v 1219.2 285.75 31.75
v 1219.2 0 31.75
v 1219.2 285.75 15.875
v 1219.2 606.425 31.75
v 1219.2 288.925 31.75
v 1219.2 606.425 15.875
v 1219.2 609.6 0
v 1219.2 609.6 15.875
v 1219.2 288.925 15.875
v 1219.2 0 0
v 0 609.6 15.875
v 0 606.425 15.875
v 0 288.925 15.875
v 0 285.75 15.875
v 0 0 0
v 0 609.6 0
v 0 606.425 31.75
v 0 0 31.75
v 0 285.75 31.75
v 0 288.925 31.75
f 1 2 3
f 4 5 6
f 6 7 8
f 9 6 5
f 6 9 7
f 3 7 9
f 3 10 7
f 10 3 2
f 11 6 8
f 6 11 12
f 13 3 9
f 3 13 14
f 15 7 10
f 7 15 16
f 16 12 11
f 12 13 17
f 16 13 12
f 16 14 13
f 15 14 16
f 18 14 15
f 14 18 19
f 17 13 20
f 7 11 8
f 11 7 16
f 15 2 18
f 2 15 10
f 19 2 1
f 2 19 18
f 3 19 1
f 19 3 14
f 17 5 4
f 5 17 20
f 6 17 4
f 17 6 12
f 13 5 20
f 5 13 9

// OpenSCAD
$fn=100;
NozzleWidth = 1.0;
LayerHeight = 0.24;
InitialLayerHeight = 0.4;
mmPerInch = 25.4;

function InchTomm(inches = 1) = inches * mmPerInch;
function height2layers(mm = 1) = mm/LayerHeight;
function layers2Height(layers) = InitialLayerHeight + ((layers - 1) * LayerHeight);
function BaseHeight() = layers2Height(6);
function WallThickness(count) = count * NozzleWidth;

ply48 = InchTomm(48);
ply24 = InchTomm(24);
plyThickness = InchTomm(5/8);
plyHeight = ply48;
plyWidth = ply24;
BoxWidth = InchTomm(12.5);
BoxLength = ply48;
BladeWidth = InchTomm(1/8);

Build();

module Build(args) 
{
    // BuildBox();
    Cuts();
}

module BuildBox(args) 
{
    //Right Side
    translate([0, BoxWidth, plyThickness]) 
    rotate([90,0,0])
    PlywoodSheet(length = plyHeight, width= plyWidth, thickness = plyThickness);

    //Left Side
    translate([0, plyThickness, plyThickness]) 
    rotate([90,0,0])
    PlywoodSheet(length = plyHeight, width= plyWidth, thickness = plyThickness);

    //Front Side
    translate([0, plyThickness, plyWidth + plyThickness ]) 
    rotate([0,90,0])
    PlywoodSheet(length = plyWidth , width= BoxWidth - 2*plyThickness, thickness = plyThickness);

    //Back Side
    translate([BoxLength - plyThickness, plyThickness, plyWidth + plyThickness ]) 
    rotate([0,90,0])
    PlywoodSheet(length = plyWidth , width= BoxWidth - 2*plyThickness, thickness = plyThickness);

    //Bottom
    PlywoodSheet(length = BoxLength, width= BoxWidth, thickness = plyThickness);

    echo("Cut List");
    echo(part = "Sides", Height = plyHeight/mmPerInch, Width = plyWidth/mmPerInch);
    echo(part = "Bottom", Height = BoxLength/mmPerInch, Width = BoxWidth/mmPerInch);
    echo(part = "Front & Back", Height = plyWidth/mmPerInch, Width = (BoxWidth - 2*plyThickness)/mmPerInch);
}

module Cuts()
{
    //sheet
    color("blue")PlywoodSheet(length = plyHeight, width= plyWidth, thickness = plyThickness);

    //Front
    // echo(length = plyWidth/mmPerInch , width= (BoxWidth - 2*plyThickness)/mmPerInch);
    translate([0,0,plyThickness])
    rotate([0,0,0])
    color("red")PlywoodSheet(length = plyWidth , width= BoxWidth - 2*plyThickness, thickness = plyThickness);

    //Back
    translate([plyWidth,0,plyThickness])
    rotate([0,0,0])
    color("pink")PlywoodSheet(length = plyWidth , width= BoxWidth - 2*plyThickness, thickness = plyThickness);

    //Bottom
    translate([0, BoxWidth - ( 2*plyThickness) + BladeWidth, plyThickness])
    rotate([0,0,0])
    color("yellow")PlywoodSheet(length = BoxLength , width= BoxWidth, thickness = plyThickness);

    echo("Cut List");
    echo(part = "Sides", Height = plyHeight/mmPerInch, Width = plyWidth/mmPerInch);
    echo(part = "Bottom", Height = BoxLength/mmPerInch, Width = BoxWidth/mmPerInch);
    echo(part = "Front & Back", Height = plyWidth/mmPerInch, Width = (BoxWidth - 2*plyThickness)/mmPerInch);
}

module PlywoodSheet(length = 0, width= 0, thickness = 0)
{
    cube(size=[length, width, thickness], center=false);
}
